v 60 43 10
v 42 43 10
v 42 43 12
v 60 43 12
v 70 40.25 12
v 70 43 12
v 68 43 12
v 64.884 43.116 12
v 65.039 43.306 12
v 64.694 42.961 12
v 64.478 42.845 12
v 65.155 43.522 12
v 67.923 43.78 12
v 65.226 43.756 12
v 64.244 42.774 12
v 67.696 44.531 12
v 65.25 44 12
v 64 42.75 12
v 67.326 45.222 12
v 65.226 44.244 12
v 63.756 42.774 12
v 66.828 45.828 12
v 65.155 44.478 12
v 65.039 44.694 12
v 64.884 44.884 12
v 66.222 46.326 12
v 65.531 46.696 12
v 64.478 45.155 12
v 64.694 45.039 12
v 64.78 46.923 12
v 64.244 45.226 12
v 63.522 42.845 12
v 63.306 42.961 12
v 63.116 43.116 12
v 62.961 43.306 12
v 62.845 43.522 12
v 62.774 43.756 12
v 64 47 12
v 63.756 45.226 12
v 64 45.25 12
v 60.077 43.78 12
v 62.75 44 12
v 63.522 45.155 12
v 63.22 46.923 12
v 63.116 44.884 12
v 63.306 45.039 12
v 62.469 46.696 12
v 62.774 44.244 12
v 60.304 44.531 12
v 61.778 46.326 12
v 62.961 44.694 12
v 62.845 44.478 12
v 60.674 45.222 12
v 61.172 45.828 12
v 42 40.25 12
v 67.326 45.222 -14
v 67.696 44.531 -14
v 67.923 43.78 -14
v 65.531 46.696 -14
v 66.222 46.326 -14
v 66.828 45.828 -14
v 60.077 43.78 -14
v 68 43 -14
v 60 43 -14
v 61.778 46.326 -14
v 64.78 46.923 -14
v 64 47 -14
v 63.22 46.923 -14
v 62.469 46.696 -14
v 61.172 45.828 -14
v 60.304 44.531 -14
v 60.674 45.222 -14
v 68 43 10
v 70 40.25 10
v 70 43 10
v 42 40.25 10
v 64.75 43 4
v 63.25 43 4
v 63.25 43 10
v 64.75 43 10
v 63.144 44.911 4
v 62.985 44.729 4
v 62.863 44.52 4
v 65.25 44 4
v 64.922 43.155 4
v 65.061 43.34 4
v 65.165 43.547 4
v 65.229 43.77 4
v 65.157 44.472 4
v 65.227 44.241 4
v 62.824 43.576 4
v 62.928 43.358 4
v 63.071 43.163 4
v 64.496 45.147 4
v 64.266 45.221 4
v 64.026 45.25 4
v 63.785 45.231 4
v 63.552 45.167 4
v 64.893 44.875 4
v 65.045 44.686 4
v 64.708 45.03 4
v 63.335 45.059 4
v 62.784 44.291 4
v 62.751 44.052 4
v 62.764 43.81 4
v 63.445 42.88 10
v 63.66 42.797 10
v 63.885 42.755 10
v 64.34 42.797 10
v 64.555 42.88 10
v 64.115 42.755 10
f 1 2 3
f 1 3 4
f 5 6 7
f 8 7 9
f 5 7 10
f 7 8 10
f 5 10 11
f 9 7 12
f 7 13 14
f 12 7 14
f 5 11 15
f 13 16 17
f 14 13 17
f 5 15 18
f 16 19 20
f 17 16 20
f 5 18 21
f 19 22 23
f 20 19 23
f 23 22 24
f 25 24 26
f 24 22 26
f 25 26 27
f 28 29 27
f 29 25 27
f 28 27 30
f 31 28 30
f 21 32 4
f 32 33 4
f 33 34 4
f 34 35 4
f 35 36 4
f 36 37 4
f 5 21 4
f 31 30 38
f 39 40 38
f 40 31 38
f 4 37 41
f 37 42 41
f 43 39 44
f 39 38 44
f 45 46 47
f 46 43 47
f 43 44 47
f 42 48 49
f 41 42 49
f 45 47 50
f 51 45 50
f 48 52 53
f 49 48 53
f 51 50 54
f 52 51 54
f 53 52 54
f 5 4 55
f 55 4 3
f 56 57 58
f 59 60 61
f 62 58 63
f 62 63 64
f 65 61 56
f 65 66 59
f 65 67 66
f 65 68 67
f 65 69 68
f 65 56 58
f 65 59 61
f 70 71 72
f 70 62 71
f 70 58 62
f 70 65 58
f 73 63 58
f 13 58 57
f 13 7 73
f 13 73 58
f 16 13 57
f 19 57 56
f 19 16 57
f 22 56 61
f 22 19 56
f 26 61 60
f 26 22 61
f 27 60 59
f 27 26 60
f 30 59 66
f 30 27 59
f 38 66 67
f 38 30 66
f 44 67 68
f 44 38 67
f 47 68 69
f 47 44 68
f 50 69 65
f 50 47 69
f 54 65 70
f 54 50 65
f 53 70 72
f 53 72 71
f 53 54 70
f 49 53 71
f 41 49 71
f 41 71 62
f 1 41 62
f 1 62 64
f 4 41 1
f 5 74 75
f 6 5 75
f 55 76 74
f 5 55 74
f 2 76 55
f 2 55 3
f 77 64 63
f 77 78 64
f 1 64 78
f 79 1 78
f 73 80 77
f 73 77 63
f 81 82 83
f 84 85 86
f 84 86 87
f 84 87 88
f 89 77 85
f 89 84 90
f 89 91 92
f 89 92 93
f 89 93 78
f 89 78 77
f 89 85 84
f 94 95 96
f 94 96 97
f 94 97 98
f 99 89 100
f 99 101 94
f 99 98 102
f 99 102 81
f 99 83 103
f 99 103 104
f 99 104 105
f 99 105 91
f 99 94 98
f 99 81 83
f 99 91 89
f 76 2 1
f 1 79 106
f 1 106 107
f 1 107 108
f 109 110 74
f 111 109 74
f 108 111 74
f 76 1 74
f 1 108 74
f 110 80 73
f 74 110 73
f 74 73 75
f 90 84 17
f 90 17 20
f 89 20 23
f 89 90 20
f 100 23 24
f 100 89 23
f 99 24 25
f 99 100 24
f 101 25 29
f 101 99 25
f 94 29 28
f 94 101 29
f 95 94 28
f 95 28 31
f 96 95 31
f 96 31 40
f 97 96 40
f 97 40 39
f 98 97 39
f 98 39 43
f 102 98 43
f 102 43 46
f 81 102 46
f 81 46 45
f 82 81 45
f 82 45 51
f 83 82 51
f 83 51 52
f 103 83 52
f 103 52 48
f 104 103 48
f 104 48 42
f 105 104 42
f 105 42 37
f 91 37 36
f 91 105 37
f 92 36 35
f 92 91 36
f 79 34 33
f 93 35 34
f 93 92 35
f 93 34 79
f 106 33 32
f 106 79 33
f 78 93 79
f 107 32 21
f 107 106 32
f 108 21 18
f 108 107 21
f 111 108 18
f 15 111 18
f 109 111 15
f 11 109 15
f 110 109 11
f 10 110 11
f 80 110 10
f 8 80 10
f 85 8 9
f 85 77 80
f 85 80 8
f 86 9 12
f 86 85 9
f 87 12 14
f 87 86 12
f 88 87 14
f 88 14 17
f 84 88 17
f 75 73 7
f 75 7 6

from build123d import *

# Parameters (mm, degrees)
CYLINDER026_R     = 1.25
CYLINDER026_DEPTH = 10
CYLINDER027_W     = 4
CYLINDER027_H     = 26
CYLINDER027_ANGLE = 180
BOX029_W          = 28
BOX029_H          = 2.75
BOX029_DEPTH      = 2


with BuildPart() as b_no001:
    # Cylinder026 → Cylinder026 (new body)
    with BuildSketch(Plane(origin=(55, 29, 4), x_dir=(1, 0, 0), z_dir=(0, 0, 1))):
        Circle(CYLINDER026_R)
    extrude(amount=CYLINDER026_DEPTH)


with BuildPart() as s015:
    # Cylinder027 → Cylinder027 (revolve)
    with BuildSketch(Plane(origin=(55, 28, -14), x_dir=(1, 0, 0), z_dir=(0, -1, 0))):
        with Locations((2, 13)):
            Rectangle(CYLINDER027_W, CYLINDER027_H)
    revolve(axis=Axis((55, 28, -14), (0, 0, 1)), revolution_arc=CYLINDER027_ANGLE)


with BuildPart() as cut010_nno:
    # Box029 → Box029 (new body)
    with BuildSketch(Plane(origin=(33, 25.25, 10), x_dir=(1, 0, 0), z_dir=(0, 0, 1))):
        with Locations((14, 1.375)):
            Rectangle(BOX029_W, BOX029_H)
    extrude(amount=BOX029_DEPTH)

    # Fusion: union S015
    add(s015.part)

    # Cut010: cut B_NO001
    add(b_no001.part, mode=Mode.SUBTRACT)


with BuildPart() as cut010_nno_1:
    # Cut010 placement: moved
    add(cut010_nno.part.moved(Location((9, 15, 0))))


solid = cut010_nno_1.part
